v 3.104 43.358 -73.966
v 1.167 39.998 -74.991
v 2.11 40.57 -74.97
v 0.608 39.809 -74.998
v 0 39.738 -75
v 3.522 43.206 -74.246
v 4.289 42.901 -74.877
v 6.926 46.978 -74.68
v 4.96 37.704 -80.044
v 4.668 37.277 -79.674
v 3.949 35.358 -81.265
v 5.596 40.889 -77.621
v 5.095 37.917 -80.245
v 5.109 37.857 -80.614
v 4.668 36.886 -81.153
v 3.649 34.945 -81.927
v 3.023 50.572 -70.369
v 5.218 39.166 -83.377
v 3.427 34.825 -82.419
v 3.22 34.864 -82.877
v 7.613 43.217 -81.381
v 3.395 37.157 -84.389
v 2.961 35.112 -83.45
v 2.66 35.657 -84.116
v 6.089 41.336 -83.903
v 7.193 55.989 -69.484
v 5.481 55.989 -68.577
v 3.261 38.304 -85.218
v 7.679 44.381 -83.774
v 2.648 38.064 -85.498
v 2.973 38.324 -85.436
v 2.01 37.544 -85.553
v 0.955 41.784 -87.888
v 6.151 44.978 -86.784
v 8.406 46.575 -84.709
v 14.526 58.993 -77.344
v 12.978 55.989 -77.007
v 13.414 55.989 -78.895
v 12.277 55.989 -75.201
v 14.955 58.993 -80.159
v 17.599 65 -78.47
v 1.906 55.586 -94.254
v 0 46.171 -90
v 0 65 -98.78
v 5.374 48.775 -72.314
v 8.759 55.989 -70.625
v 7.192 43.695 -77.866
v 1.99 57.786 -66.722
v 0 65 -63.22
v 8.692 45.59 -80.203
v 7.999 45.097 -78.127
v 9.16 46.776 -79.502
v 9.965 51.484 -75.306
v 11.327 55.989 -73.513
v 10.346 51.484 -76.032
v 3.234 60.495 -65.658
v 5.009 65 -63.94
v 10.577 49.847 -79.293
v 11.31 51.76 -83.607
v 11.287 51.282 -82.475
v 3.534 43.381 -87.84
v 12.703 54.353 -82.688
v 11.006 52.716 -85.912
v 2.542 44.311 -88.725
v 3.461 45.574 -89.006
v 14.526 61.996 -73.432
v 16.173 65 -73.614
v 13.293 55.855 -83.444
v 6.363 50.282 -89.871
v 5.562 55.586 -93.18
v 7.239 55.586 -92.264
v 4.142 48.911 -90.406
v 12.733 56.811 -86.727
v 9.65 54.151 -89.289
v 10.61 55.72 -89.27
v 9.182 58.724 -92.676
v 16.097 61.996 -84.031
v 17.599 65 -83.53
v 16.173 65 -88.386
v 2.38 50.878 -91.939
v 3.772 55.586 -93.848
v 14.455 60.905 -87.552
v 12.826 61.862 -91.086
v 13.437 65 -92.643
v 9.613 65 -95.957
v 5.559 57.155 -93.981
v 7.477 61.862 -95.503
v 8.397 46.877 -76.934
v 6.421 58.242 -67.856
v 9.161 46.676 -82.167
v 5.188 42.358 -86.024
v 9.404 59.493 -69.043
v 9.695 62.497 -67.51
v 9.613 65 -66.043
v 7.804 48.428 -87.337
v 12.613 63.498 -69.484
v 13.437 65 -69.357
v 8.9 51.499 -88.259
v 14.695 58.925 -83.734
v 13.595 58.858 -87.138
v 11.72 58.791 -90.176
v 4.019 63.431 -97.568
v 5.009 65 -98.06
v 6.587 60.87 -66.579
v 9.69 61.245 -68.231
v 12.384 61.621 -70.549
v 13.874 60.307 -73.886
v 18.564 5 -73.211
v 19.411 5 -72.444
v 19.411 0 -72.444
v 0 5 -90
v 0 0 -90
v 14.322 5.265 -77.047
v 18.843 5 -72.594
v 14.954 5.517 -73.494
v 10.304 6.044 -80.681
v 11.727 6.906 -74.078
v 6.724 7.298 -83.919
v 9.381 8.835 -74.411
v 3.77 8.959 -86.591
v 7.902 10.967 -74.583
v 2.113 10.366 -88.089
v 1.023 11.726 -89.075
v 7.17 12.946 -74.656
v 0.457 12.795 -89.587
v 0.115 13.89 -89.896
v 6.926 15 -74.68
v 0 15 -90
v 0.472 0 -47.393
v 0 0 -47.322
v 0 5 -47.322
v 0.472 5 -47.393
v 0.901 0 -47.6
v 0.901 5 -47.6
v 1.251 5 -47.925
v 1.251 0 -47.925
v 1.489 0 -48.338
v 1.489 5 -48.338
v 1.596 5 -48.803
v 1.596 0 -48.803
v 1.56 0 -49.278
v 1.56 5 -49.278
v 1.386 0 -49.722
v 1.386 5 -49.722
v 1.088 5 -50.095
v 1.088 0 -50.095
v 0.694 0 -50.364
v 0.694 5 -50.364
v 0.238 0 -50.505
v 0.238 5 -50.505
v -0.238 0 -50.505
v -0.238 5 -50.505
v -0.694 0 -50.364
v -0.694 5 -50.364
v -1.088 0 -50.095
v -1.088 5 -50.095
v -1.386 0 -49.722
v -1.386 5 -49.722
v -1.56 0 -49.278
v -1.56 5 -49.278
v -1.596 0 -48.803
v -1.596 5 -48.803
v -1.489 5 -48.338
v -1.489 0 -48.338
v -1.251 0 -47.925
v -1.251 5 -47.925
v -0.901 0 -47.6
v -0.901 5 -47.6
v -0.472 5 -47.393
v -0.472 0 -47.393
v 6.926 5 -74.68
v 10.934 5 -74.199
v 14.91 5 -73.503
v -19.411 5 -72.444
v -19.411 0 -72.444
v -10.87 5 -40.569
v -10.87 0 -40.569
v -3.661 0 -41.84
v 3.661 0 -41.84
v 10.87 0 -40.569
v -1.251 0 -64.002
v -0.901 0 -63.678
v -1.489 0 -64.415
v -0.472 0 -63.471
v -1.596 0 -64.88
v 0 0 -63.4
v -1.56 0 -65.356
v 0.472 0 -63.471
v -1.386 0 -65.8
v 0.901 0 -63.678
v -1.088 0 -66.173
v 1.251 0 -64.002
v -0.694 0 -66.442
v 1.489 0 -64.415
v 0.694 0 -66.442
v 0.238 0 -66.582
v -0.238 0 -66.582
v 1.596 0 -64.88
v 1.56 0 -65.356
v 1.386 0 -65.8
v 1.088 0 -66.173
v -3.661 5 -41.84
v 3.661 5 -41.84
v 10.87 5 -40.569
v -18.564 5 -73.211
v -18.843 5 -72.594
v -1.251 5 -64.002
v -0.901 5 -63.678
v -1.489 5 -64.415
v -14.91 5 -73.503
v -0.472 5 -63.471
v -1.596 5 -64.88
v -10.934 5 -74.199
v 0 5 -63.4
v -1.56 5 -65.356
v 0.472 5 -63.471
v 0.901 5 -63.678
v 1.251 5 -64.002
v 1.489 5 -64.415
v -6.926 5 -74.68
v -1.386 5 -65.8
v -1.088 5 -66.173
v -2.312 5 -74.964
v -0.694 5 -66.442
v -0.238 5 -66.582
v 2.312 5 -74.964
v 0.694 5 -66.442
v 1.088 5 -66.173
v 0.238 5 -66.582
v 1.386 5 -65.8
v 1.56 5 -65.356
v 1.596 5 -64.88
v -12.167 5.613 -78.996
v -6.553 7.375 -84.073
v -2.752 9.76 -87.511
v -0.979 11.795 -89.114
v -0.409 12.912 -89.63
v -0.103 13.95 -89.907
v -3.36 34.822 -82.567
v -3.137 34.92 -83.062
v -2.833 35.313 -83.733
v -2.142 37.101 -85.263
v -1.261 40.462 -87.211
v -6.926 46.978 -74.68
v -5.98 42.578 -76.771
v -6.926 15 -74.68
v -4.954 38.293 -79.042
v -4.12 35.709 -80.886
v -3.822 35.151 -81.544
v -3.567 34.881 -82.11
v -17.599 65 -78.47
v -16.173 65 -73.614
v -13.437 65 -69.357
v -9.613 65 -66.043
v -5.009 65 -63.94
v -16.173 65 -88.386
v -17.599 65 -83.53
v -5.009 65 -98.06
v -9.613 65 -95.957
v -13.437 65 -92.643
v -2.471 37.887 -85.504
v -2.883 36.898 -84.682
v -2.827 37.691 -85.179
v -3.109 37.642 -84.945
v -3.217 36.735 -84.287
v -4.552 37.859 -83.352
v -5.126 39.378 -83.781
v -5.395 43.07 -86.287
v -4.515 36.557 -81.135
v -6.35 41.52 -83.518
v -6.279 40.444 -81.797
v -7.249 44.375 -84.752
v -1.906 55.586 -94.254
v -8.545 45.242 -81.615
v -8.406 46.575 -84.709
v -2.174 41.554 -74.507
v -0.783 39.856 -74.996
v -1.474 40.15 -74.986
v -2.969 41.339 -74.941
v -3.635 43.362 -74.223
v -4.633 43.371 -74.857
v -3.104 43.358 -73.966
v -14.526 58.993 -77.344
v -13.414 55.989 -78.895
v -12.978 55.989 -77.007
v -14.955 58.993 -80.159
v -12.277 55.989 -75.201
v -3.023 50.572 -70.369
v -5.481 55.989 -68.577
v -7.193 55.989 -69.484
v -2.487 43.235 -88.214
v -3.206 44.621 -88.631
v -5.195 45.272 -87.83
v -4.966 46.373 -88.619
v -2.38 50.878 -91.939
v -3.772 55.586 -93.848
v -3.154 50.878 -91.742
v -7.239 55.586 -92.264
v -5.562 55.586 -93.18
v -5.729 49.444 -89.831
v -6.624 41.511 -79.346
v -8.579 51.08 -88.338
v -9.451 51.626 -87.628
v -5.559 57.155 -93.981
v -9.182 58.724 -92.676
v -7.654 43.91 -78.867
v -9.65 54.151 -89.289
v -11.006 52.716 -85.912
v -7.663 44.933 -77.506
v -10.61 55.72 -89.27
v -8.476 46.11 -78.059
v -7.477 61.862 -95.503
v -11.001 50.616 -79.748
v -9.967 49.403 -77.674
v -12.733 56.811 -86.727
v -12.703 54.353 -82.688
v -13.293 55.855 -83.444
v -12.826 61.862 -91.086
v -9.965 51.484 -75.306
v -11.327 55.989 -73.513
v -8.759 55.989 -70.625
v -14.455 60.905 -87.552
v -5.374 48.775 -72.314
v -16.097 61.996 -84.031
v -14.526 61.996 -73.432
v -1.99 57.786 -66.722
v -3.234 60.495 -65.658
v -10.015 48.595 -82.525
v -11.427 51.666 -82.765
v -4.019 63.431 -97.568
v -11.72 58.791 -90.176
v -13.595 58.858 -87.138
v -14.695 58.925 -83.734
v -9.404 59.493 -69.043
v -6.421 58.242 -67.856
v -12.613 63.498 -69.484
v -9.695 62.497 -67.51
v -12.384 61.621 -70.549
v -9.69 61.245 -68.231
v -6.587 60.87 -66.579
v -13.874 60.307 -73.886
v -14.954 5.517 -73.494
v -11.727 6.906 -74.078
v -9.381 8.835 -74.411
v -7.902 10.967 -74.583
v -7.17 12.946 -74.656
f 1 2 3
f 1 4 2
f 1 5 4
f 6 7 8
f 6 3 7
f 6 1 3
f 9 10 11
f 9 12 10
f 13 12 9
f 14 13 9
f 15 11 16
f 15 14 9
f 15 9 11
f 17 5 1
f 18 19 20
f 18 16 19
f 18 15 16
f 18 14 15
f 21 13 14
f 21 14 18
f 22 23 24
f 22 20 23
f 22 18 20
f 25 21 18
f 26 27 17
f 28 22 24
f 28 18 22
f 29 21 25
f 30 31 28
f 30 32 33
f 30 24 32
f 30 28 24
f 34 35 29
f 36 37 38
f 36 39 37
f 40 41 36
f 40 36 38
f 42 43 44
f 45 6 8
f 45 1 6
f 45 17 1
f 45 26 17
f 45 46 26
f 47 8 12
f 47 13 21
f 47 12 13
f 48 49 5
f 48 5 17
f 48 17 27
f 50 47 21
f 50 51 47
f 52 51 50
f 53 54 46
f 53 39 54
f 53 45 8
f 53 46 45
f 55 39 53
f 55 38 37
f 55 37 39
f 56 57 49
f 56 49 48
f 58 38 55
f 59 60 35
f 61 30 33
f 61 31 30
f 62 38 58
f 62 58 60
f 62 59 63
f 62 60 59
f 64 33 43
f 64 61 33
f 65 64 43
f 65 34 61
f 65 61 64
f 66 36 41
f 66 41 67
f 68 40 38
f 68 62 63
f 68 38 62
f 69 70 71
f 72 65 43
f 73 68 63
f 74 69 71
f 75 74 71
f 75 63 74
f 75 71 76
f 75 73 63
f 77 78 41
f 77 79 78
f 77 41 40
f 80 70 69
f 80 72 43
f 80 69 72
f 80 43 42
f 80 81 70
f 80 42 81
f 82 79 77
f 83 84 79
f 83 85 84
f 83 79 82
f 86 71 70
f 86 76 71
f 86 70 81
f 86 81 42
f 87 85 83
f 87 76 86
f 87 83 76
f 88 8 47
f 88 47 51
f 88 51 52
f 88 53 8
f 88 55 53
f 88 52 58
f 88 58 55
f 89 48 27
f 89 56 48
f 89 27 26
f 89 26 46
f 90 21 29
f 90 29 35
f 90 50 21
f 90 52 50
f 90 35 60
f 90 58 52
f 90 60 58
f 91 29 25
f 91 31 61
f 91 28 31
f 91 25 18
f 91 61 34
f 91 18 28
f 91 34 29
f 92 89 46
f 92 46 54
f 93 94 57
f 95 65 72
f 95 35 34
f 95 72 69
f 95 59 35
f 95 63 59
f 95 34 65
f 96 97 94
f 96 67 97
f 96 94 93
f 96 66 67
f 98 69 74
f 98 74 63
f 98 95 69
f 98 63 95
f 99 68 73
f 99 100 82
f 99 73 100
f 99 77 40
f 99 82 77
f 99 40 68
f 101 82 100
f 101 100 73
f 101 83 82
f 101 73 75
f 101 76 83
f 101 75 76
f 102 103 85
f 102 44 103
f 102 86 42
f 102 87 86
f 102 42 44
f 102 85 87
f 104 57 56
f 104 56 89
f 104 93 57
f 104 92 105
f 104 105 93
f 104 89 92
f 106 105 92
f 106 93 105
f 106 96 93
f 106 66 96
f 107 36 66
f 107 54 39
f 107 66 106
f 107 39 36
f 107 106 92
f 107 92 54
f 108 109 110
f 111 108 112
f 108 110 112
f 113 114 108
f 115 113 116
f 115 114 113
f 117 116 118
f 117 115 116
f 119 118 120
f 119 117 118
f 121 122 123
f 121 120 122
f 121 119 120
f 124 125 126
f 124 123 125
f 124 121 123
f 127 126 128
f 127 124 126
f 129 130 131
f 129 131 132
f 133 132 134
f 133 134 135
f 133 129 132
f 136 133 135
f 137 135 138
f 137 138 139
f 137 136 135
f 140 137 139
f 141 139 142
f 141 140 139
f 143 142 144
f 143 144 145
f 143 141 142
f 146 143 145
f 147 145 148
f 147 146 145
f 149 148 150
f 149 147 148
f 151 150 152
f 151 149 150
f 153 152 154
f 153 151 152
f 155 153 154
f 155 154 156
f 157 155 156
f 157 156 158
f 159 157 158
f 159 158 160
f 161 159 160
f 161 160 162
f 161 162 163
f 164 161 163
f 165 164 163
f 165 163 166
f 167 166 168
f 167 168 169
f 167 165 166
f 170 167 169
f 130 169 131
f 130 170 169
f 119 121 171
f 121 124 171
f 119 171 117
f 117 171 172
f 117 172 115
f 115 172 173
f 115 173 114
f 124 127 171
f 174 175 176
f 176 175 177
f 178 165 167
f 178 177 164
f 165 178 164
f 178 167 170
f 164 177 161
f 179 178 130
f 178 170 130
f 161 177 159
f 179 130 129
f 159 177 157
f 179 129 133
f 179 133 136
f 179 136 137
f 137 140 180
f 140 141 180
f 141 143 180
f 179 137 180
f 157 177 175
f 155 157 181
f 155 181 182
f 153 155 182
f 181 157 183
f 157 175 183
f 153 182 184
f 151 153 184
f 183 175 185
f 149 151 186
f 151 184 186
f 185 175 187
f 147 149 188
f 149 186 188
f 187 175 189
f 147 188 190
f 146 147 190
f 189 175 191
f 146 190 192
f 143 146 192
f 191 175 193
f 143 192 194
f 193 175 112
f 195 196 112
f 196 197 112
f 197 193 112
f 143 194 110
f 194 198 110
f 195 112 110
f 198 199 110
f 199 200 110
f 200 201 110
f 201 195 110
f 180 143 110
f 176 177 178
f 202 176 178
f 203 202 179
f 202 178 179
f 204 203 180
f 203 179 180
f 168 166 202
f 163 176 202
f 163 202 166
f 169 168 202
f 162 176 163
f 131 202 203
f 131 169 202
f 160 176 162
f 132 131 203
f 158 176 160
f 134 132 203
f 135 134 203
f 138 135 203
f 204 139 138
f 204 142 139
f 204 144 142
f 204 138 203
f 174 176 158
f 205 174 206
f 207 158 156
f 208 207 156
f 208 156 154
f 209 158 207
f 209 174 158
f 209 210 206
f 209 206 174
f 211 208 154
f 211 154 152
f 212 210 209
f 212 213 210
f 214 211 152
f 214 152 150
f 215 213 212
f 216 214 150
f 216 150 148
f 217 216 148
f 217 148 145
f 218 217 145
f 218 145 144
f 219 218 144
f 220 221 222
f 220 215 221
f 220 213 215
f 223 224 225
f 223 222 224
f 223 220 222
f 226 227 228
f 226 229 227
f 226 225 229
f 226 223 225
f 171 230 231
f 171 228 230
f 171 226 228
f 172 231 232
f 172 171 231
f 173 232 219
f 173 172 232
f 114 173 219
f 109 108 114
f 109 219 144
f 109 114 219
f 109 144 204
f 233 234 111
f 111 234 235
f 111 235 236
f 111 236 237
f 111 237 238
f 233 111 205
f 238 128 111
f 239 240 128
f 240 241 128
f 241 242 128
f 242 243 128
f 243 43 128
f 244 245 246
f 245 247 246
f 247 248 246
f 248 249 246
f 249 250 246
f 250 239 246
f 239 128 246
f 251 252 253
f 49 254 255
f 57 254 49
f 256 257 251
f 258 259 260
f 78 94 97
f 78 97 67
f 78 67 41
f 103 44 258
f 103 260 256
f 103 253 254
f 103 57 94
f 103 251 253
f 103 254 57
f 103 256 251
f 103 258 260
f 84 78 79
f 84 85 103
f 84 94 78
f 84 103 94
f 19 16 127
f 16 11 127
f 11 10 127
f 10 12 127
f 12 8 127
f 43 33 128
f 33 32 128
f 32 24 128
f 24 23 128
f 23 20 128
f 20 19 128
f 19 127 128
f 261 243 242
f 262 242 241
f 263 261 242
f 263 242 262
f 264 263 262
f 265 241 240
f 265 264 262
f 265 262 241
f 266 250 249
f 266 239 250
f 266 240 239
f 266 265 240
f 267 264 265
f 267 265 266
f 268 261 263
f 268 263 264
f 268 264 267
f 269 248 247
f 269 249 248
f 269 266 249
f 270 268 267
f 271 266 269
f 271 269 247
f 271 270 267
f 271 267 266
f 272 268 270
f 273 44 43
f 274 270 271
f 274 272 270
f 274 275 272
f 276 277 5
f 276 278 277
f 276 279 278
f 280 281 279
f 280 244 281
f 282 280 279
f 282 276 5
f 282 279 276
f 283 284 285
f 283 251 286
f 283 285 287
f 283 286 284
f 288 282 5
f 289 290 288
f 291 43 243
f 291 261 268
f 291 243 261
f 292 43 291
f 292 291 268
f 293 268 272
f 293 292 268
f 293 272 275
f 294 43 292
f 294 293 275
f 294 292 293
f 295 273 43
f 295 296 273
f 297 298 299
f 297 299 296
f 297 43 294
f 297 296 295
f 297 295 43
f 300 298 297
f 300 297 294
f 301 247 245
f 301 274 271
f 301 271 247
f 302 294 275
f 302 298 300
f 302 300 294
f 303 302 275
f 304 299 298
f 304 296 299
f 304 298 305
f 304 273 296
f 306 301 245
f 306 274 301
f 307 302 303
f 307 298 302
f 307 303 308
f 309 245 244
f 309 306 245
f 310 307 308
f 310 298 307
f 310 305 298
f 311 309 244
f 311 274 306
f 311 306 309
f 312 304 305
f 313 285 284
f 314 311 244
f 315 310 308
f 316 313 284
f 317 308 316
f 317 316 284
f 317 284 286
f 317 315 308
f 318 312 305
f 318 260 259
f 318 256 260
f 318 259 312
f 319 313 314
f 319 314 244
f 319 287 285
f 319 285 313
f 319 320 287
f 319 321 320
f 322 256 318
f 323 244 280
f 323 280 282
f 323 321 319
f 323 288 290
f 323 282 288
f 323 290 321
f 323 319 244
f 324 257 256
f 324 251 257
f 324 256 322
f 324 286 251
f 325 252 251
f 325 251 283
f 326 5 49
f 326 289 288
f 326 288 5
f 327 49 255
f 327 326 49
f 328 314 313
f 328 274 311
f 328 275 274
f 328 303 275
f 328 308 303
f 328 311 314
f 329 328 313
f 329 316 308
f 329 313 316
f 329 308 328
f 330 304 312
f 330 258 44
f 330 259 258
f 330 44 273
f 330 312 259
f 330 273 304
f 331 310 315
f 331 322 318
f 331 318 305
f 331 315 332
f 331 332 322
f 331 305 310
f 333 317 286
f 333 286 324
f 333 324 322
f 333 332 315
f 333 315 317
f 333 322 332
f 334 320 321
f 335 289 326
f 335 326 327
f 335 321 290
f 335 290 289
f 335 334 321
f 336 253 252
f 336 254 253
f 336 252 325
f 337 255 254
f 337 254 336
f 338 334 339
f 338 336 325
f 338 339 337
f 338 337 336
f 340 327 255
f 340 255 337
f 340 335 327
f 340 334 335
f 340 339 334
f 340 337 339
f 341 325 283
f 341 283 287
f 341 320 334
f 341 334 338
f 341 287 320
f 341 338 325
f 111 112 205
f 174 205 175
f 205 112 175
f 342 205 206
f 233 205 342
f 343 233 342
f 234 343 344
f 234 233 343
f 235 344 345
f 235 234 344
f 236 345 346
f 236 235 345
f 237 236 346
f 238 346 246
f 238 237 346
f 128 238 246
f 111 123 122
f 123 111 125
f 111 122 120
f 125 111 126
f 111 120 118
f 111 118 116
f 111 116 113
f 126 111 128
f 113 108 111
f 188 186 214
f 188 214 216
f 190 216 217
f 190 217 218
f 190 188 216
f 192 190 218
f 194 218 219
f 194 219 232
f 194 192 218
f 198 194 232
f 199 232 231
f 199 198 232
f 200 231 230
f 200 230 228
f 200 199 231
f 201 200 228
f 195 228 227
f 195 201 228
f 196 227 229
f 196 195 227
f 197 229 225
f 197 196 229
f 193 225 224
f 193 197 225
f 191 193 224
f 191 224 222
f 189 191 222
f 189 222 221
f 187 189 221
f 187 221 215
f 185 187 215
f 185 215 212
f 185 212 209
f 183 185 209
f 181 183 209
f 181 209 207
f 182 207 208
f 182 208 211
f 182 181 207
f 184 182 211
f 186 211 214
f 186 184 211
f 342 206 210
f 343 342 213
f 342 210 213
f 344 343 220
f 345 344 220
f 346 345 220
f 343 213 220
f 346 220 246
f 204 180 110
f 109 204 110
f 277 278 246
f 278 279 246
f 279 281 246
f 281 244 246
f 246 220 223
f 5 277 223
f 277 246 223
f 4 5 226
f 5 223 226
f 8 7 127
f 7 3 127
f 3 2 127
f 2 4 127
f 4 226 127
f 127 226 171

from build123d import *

# Parameters (mm, degrees)
SKETCH_1_R      = 1.6
EXTRUDE_1_DEPTH = 5
EXTRUDE_2_DEPTH = 60
FILLET_2_R      = 10
FILLET_3_R      = 10


with BuildPart() as part:
    # 草图1 → 凸台-拉伸1 (new body)
    with BuildSketch(Plane(origin=(0, 0, 0), x_dir=(1, 0, 0), z_dir=(0, 1, 0))):
        with BuildLine():
            ThreePointArc((-10.870399894, 40.568884704), (0, 42), (10.870399894, 40.568884704))
            Line((10.870399894, 40.568884704), (19.411428383, 72.444436972))
            Line((19.411428383, 72.444436972), (0, 90))
            Line((0, 90), (-19.411428383, 72.444436972))
            Line((-19.411428383, 72.444436972), (-10.870399894, 40.568884704))
        make_face()
        with Locations(Location((0, 65, 0), (0, 0, 270))):
            Circle(SKETCH_1_R, mode=Mode.SUBTRACT)
        with Locations(Location((0, 48.92241394, 0), (0, 0, 270))):
            Circle(SKETCH_1_R, mode=Mode.SUBTRACT)
    extrude(amount=EXTRUDE_1_DEPTH)

    # 草图5 → 凸台-拉伸2 (add)
    with BuildSketch(Plane(origin=(0, 5, 0), x_dir=(1, 0, 0), z_dir=(0, 1, 0))):
        with BuildLine():
            Line((0, 90), (-6.925726506, 74.679544136))
            ThreePointArc((-6.925726506, 74.679544136), (0, 75), (6.925726506, 74.679544136))
            Line((6.925726506, 74.679544136), (0, 90))
        make_face()
    extrude(amount=EXTRUDE_2_DEPTH)

    # 旋转1: read off the stored shape, not the designer's step
    # 旋转1: loft between two sections, ruled curve by curve
    revolve_1_from = [
        Edge.make_three_point_arc((1e-09, 34.818833313, -84.706290842), (-3.706290842, 34.818833313, -81.000000001), (0, 34.818833313, -77.293709158)),
        Edge.make_three_point_arc((0, 34.818833313, -77.293709158), (3.706290842, 34.818833313, -81), (1e-09, 34.818833313, -84.706290842)),
    ]
    revolve_1_to = [
        Edge.make_three_point_arc((3e-09, 65, -98.78), (-17.78, 65, -81.000000003), (-2e-09, 65, -63.22)),
        Edge.make_three_point_arc((-2e-09, 65, -63.22), (17.78, 65, -80.999999999), (3e-09, 65, -98.78)),
    ]
    revolve_1 = Solid(Shell([*[Face.make_surface_from_curves(revolve_1_from[k], revolve_1_to[k]) for k in range(2)], Face(Wire(revolve_1_from)), Face(Wire(revolve_1_to))]))
    add(revolve_1)

    # 圆角2
    # the kernel refuses this fillet: 10 mm, written as the material it adds along each edge
    with BuildSketch(Plane(origin=(17.223805664, 5, -51.899079574), x_dir=(0.9112185824712705, 0, -0.4119231663296544), z_dir=(-0.4119231663296544, 0, -0.9112185824712706))) as fillet_2_piece_1_section:
        with BuildLine():
            CenterArc((FILLET_2_R, -FILLET_2_R), FILLET_2_R, 90, 90)
            Line((0, -FILLET_2_R), (0, 0))
            Line((0, 0), (FILLET_2_R, 0))
        make_face()
    fillet_2_piece_1 = extrude(amount=66.813151267, mode=Mode.PRIVATE)
    fillet_2_piece_1 = split(fillet_2_piece_1, bisect_by=Plane(origin=(28.429094155, 5, -64.28892174), z_dir=(-0.6707629255291222, 0, 0.7416718261708566)), keep=Keep.TOP, mode=Mode.PRIVATE)
    fillet_2_piece_1 = split(fillet_2_piece_1, bisect_by=Plane(origin=(-11.378711034, 5, -64.829060887), z_dir=(0.9112185824712704, 0, 0.411923166329655)), keep=Keep.TOP, mode=Mode.PRIVATE)
    fillet_2_piece_1 = fillet_2_piece_1 - Plane(origin=(0, 5, 0), x_dir=(-0.09234302007576177, 0, -0.9957272551473558), z_dir=(0, -1, 0)) * Cylinder(75, 174, mode=Mode.PRIVATE)
    add(fillet_2_piece_1)

    # 圆角3
    # the kernel refuses this fillet: 10 mm, written as the material it adds along each edge
    with BuildSketch(Plane(origin=(10.298079158, 5, -112.780464562), x_dir=(-0.9112185824712703, 0, -0.41192316632965503), z_dir=(-0.411923166329655, 0, 0.9112185824712704))) as fillet_3_piece_1_section:
        with BuildLine():
            CenterArc((FILLET_3_R, -FILLET_3_R), FILLET_3_R, 90, 90)
            Line((0, -FILLET_3_R), (0, 0))
            Line((0, 0), (FILLET_3_R, 0))
        make_face()
    fillet_3_piece_1 = extrude(amount=66.813151267, mode=Mode.PRIVATE)
    fillet_3_piece_1 = split(fillet_3_piece_1, bisect_by=Plane(origin=(16.997698866, 5, -105.372602567), z_dir=(0.6707629255291219, 0, 0.7416718261708569)), keep=Keep.TOP, mode=Mode.PRIVATE)
    fillet_3_piece_1 = fillet_3_piece_1 - Plane(origin=(0, 5, 0), x_dir=(-0.0923430200760307, 0, -0.995727255147331), z_dir=(0, -1, 0)) * Cylinder(75, 174, mode=Mode.PRIVATE)
    fillet_3_piece_1 = split(fillet_3_piece_1, bisect_by=Plane(origin=(-5.668223875, 5, -95.126302894), z_dir=(-0.6707629255289835, 0, 0.7416718261709819)), keep=Keep.TOP, mode=Mode.PRIVATE)
    add(fillet_3_piece_1)


solid = part.part
